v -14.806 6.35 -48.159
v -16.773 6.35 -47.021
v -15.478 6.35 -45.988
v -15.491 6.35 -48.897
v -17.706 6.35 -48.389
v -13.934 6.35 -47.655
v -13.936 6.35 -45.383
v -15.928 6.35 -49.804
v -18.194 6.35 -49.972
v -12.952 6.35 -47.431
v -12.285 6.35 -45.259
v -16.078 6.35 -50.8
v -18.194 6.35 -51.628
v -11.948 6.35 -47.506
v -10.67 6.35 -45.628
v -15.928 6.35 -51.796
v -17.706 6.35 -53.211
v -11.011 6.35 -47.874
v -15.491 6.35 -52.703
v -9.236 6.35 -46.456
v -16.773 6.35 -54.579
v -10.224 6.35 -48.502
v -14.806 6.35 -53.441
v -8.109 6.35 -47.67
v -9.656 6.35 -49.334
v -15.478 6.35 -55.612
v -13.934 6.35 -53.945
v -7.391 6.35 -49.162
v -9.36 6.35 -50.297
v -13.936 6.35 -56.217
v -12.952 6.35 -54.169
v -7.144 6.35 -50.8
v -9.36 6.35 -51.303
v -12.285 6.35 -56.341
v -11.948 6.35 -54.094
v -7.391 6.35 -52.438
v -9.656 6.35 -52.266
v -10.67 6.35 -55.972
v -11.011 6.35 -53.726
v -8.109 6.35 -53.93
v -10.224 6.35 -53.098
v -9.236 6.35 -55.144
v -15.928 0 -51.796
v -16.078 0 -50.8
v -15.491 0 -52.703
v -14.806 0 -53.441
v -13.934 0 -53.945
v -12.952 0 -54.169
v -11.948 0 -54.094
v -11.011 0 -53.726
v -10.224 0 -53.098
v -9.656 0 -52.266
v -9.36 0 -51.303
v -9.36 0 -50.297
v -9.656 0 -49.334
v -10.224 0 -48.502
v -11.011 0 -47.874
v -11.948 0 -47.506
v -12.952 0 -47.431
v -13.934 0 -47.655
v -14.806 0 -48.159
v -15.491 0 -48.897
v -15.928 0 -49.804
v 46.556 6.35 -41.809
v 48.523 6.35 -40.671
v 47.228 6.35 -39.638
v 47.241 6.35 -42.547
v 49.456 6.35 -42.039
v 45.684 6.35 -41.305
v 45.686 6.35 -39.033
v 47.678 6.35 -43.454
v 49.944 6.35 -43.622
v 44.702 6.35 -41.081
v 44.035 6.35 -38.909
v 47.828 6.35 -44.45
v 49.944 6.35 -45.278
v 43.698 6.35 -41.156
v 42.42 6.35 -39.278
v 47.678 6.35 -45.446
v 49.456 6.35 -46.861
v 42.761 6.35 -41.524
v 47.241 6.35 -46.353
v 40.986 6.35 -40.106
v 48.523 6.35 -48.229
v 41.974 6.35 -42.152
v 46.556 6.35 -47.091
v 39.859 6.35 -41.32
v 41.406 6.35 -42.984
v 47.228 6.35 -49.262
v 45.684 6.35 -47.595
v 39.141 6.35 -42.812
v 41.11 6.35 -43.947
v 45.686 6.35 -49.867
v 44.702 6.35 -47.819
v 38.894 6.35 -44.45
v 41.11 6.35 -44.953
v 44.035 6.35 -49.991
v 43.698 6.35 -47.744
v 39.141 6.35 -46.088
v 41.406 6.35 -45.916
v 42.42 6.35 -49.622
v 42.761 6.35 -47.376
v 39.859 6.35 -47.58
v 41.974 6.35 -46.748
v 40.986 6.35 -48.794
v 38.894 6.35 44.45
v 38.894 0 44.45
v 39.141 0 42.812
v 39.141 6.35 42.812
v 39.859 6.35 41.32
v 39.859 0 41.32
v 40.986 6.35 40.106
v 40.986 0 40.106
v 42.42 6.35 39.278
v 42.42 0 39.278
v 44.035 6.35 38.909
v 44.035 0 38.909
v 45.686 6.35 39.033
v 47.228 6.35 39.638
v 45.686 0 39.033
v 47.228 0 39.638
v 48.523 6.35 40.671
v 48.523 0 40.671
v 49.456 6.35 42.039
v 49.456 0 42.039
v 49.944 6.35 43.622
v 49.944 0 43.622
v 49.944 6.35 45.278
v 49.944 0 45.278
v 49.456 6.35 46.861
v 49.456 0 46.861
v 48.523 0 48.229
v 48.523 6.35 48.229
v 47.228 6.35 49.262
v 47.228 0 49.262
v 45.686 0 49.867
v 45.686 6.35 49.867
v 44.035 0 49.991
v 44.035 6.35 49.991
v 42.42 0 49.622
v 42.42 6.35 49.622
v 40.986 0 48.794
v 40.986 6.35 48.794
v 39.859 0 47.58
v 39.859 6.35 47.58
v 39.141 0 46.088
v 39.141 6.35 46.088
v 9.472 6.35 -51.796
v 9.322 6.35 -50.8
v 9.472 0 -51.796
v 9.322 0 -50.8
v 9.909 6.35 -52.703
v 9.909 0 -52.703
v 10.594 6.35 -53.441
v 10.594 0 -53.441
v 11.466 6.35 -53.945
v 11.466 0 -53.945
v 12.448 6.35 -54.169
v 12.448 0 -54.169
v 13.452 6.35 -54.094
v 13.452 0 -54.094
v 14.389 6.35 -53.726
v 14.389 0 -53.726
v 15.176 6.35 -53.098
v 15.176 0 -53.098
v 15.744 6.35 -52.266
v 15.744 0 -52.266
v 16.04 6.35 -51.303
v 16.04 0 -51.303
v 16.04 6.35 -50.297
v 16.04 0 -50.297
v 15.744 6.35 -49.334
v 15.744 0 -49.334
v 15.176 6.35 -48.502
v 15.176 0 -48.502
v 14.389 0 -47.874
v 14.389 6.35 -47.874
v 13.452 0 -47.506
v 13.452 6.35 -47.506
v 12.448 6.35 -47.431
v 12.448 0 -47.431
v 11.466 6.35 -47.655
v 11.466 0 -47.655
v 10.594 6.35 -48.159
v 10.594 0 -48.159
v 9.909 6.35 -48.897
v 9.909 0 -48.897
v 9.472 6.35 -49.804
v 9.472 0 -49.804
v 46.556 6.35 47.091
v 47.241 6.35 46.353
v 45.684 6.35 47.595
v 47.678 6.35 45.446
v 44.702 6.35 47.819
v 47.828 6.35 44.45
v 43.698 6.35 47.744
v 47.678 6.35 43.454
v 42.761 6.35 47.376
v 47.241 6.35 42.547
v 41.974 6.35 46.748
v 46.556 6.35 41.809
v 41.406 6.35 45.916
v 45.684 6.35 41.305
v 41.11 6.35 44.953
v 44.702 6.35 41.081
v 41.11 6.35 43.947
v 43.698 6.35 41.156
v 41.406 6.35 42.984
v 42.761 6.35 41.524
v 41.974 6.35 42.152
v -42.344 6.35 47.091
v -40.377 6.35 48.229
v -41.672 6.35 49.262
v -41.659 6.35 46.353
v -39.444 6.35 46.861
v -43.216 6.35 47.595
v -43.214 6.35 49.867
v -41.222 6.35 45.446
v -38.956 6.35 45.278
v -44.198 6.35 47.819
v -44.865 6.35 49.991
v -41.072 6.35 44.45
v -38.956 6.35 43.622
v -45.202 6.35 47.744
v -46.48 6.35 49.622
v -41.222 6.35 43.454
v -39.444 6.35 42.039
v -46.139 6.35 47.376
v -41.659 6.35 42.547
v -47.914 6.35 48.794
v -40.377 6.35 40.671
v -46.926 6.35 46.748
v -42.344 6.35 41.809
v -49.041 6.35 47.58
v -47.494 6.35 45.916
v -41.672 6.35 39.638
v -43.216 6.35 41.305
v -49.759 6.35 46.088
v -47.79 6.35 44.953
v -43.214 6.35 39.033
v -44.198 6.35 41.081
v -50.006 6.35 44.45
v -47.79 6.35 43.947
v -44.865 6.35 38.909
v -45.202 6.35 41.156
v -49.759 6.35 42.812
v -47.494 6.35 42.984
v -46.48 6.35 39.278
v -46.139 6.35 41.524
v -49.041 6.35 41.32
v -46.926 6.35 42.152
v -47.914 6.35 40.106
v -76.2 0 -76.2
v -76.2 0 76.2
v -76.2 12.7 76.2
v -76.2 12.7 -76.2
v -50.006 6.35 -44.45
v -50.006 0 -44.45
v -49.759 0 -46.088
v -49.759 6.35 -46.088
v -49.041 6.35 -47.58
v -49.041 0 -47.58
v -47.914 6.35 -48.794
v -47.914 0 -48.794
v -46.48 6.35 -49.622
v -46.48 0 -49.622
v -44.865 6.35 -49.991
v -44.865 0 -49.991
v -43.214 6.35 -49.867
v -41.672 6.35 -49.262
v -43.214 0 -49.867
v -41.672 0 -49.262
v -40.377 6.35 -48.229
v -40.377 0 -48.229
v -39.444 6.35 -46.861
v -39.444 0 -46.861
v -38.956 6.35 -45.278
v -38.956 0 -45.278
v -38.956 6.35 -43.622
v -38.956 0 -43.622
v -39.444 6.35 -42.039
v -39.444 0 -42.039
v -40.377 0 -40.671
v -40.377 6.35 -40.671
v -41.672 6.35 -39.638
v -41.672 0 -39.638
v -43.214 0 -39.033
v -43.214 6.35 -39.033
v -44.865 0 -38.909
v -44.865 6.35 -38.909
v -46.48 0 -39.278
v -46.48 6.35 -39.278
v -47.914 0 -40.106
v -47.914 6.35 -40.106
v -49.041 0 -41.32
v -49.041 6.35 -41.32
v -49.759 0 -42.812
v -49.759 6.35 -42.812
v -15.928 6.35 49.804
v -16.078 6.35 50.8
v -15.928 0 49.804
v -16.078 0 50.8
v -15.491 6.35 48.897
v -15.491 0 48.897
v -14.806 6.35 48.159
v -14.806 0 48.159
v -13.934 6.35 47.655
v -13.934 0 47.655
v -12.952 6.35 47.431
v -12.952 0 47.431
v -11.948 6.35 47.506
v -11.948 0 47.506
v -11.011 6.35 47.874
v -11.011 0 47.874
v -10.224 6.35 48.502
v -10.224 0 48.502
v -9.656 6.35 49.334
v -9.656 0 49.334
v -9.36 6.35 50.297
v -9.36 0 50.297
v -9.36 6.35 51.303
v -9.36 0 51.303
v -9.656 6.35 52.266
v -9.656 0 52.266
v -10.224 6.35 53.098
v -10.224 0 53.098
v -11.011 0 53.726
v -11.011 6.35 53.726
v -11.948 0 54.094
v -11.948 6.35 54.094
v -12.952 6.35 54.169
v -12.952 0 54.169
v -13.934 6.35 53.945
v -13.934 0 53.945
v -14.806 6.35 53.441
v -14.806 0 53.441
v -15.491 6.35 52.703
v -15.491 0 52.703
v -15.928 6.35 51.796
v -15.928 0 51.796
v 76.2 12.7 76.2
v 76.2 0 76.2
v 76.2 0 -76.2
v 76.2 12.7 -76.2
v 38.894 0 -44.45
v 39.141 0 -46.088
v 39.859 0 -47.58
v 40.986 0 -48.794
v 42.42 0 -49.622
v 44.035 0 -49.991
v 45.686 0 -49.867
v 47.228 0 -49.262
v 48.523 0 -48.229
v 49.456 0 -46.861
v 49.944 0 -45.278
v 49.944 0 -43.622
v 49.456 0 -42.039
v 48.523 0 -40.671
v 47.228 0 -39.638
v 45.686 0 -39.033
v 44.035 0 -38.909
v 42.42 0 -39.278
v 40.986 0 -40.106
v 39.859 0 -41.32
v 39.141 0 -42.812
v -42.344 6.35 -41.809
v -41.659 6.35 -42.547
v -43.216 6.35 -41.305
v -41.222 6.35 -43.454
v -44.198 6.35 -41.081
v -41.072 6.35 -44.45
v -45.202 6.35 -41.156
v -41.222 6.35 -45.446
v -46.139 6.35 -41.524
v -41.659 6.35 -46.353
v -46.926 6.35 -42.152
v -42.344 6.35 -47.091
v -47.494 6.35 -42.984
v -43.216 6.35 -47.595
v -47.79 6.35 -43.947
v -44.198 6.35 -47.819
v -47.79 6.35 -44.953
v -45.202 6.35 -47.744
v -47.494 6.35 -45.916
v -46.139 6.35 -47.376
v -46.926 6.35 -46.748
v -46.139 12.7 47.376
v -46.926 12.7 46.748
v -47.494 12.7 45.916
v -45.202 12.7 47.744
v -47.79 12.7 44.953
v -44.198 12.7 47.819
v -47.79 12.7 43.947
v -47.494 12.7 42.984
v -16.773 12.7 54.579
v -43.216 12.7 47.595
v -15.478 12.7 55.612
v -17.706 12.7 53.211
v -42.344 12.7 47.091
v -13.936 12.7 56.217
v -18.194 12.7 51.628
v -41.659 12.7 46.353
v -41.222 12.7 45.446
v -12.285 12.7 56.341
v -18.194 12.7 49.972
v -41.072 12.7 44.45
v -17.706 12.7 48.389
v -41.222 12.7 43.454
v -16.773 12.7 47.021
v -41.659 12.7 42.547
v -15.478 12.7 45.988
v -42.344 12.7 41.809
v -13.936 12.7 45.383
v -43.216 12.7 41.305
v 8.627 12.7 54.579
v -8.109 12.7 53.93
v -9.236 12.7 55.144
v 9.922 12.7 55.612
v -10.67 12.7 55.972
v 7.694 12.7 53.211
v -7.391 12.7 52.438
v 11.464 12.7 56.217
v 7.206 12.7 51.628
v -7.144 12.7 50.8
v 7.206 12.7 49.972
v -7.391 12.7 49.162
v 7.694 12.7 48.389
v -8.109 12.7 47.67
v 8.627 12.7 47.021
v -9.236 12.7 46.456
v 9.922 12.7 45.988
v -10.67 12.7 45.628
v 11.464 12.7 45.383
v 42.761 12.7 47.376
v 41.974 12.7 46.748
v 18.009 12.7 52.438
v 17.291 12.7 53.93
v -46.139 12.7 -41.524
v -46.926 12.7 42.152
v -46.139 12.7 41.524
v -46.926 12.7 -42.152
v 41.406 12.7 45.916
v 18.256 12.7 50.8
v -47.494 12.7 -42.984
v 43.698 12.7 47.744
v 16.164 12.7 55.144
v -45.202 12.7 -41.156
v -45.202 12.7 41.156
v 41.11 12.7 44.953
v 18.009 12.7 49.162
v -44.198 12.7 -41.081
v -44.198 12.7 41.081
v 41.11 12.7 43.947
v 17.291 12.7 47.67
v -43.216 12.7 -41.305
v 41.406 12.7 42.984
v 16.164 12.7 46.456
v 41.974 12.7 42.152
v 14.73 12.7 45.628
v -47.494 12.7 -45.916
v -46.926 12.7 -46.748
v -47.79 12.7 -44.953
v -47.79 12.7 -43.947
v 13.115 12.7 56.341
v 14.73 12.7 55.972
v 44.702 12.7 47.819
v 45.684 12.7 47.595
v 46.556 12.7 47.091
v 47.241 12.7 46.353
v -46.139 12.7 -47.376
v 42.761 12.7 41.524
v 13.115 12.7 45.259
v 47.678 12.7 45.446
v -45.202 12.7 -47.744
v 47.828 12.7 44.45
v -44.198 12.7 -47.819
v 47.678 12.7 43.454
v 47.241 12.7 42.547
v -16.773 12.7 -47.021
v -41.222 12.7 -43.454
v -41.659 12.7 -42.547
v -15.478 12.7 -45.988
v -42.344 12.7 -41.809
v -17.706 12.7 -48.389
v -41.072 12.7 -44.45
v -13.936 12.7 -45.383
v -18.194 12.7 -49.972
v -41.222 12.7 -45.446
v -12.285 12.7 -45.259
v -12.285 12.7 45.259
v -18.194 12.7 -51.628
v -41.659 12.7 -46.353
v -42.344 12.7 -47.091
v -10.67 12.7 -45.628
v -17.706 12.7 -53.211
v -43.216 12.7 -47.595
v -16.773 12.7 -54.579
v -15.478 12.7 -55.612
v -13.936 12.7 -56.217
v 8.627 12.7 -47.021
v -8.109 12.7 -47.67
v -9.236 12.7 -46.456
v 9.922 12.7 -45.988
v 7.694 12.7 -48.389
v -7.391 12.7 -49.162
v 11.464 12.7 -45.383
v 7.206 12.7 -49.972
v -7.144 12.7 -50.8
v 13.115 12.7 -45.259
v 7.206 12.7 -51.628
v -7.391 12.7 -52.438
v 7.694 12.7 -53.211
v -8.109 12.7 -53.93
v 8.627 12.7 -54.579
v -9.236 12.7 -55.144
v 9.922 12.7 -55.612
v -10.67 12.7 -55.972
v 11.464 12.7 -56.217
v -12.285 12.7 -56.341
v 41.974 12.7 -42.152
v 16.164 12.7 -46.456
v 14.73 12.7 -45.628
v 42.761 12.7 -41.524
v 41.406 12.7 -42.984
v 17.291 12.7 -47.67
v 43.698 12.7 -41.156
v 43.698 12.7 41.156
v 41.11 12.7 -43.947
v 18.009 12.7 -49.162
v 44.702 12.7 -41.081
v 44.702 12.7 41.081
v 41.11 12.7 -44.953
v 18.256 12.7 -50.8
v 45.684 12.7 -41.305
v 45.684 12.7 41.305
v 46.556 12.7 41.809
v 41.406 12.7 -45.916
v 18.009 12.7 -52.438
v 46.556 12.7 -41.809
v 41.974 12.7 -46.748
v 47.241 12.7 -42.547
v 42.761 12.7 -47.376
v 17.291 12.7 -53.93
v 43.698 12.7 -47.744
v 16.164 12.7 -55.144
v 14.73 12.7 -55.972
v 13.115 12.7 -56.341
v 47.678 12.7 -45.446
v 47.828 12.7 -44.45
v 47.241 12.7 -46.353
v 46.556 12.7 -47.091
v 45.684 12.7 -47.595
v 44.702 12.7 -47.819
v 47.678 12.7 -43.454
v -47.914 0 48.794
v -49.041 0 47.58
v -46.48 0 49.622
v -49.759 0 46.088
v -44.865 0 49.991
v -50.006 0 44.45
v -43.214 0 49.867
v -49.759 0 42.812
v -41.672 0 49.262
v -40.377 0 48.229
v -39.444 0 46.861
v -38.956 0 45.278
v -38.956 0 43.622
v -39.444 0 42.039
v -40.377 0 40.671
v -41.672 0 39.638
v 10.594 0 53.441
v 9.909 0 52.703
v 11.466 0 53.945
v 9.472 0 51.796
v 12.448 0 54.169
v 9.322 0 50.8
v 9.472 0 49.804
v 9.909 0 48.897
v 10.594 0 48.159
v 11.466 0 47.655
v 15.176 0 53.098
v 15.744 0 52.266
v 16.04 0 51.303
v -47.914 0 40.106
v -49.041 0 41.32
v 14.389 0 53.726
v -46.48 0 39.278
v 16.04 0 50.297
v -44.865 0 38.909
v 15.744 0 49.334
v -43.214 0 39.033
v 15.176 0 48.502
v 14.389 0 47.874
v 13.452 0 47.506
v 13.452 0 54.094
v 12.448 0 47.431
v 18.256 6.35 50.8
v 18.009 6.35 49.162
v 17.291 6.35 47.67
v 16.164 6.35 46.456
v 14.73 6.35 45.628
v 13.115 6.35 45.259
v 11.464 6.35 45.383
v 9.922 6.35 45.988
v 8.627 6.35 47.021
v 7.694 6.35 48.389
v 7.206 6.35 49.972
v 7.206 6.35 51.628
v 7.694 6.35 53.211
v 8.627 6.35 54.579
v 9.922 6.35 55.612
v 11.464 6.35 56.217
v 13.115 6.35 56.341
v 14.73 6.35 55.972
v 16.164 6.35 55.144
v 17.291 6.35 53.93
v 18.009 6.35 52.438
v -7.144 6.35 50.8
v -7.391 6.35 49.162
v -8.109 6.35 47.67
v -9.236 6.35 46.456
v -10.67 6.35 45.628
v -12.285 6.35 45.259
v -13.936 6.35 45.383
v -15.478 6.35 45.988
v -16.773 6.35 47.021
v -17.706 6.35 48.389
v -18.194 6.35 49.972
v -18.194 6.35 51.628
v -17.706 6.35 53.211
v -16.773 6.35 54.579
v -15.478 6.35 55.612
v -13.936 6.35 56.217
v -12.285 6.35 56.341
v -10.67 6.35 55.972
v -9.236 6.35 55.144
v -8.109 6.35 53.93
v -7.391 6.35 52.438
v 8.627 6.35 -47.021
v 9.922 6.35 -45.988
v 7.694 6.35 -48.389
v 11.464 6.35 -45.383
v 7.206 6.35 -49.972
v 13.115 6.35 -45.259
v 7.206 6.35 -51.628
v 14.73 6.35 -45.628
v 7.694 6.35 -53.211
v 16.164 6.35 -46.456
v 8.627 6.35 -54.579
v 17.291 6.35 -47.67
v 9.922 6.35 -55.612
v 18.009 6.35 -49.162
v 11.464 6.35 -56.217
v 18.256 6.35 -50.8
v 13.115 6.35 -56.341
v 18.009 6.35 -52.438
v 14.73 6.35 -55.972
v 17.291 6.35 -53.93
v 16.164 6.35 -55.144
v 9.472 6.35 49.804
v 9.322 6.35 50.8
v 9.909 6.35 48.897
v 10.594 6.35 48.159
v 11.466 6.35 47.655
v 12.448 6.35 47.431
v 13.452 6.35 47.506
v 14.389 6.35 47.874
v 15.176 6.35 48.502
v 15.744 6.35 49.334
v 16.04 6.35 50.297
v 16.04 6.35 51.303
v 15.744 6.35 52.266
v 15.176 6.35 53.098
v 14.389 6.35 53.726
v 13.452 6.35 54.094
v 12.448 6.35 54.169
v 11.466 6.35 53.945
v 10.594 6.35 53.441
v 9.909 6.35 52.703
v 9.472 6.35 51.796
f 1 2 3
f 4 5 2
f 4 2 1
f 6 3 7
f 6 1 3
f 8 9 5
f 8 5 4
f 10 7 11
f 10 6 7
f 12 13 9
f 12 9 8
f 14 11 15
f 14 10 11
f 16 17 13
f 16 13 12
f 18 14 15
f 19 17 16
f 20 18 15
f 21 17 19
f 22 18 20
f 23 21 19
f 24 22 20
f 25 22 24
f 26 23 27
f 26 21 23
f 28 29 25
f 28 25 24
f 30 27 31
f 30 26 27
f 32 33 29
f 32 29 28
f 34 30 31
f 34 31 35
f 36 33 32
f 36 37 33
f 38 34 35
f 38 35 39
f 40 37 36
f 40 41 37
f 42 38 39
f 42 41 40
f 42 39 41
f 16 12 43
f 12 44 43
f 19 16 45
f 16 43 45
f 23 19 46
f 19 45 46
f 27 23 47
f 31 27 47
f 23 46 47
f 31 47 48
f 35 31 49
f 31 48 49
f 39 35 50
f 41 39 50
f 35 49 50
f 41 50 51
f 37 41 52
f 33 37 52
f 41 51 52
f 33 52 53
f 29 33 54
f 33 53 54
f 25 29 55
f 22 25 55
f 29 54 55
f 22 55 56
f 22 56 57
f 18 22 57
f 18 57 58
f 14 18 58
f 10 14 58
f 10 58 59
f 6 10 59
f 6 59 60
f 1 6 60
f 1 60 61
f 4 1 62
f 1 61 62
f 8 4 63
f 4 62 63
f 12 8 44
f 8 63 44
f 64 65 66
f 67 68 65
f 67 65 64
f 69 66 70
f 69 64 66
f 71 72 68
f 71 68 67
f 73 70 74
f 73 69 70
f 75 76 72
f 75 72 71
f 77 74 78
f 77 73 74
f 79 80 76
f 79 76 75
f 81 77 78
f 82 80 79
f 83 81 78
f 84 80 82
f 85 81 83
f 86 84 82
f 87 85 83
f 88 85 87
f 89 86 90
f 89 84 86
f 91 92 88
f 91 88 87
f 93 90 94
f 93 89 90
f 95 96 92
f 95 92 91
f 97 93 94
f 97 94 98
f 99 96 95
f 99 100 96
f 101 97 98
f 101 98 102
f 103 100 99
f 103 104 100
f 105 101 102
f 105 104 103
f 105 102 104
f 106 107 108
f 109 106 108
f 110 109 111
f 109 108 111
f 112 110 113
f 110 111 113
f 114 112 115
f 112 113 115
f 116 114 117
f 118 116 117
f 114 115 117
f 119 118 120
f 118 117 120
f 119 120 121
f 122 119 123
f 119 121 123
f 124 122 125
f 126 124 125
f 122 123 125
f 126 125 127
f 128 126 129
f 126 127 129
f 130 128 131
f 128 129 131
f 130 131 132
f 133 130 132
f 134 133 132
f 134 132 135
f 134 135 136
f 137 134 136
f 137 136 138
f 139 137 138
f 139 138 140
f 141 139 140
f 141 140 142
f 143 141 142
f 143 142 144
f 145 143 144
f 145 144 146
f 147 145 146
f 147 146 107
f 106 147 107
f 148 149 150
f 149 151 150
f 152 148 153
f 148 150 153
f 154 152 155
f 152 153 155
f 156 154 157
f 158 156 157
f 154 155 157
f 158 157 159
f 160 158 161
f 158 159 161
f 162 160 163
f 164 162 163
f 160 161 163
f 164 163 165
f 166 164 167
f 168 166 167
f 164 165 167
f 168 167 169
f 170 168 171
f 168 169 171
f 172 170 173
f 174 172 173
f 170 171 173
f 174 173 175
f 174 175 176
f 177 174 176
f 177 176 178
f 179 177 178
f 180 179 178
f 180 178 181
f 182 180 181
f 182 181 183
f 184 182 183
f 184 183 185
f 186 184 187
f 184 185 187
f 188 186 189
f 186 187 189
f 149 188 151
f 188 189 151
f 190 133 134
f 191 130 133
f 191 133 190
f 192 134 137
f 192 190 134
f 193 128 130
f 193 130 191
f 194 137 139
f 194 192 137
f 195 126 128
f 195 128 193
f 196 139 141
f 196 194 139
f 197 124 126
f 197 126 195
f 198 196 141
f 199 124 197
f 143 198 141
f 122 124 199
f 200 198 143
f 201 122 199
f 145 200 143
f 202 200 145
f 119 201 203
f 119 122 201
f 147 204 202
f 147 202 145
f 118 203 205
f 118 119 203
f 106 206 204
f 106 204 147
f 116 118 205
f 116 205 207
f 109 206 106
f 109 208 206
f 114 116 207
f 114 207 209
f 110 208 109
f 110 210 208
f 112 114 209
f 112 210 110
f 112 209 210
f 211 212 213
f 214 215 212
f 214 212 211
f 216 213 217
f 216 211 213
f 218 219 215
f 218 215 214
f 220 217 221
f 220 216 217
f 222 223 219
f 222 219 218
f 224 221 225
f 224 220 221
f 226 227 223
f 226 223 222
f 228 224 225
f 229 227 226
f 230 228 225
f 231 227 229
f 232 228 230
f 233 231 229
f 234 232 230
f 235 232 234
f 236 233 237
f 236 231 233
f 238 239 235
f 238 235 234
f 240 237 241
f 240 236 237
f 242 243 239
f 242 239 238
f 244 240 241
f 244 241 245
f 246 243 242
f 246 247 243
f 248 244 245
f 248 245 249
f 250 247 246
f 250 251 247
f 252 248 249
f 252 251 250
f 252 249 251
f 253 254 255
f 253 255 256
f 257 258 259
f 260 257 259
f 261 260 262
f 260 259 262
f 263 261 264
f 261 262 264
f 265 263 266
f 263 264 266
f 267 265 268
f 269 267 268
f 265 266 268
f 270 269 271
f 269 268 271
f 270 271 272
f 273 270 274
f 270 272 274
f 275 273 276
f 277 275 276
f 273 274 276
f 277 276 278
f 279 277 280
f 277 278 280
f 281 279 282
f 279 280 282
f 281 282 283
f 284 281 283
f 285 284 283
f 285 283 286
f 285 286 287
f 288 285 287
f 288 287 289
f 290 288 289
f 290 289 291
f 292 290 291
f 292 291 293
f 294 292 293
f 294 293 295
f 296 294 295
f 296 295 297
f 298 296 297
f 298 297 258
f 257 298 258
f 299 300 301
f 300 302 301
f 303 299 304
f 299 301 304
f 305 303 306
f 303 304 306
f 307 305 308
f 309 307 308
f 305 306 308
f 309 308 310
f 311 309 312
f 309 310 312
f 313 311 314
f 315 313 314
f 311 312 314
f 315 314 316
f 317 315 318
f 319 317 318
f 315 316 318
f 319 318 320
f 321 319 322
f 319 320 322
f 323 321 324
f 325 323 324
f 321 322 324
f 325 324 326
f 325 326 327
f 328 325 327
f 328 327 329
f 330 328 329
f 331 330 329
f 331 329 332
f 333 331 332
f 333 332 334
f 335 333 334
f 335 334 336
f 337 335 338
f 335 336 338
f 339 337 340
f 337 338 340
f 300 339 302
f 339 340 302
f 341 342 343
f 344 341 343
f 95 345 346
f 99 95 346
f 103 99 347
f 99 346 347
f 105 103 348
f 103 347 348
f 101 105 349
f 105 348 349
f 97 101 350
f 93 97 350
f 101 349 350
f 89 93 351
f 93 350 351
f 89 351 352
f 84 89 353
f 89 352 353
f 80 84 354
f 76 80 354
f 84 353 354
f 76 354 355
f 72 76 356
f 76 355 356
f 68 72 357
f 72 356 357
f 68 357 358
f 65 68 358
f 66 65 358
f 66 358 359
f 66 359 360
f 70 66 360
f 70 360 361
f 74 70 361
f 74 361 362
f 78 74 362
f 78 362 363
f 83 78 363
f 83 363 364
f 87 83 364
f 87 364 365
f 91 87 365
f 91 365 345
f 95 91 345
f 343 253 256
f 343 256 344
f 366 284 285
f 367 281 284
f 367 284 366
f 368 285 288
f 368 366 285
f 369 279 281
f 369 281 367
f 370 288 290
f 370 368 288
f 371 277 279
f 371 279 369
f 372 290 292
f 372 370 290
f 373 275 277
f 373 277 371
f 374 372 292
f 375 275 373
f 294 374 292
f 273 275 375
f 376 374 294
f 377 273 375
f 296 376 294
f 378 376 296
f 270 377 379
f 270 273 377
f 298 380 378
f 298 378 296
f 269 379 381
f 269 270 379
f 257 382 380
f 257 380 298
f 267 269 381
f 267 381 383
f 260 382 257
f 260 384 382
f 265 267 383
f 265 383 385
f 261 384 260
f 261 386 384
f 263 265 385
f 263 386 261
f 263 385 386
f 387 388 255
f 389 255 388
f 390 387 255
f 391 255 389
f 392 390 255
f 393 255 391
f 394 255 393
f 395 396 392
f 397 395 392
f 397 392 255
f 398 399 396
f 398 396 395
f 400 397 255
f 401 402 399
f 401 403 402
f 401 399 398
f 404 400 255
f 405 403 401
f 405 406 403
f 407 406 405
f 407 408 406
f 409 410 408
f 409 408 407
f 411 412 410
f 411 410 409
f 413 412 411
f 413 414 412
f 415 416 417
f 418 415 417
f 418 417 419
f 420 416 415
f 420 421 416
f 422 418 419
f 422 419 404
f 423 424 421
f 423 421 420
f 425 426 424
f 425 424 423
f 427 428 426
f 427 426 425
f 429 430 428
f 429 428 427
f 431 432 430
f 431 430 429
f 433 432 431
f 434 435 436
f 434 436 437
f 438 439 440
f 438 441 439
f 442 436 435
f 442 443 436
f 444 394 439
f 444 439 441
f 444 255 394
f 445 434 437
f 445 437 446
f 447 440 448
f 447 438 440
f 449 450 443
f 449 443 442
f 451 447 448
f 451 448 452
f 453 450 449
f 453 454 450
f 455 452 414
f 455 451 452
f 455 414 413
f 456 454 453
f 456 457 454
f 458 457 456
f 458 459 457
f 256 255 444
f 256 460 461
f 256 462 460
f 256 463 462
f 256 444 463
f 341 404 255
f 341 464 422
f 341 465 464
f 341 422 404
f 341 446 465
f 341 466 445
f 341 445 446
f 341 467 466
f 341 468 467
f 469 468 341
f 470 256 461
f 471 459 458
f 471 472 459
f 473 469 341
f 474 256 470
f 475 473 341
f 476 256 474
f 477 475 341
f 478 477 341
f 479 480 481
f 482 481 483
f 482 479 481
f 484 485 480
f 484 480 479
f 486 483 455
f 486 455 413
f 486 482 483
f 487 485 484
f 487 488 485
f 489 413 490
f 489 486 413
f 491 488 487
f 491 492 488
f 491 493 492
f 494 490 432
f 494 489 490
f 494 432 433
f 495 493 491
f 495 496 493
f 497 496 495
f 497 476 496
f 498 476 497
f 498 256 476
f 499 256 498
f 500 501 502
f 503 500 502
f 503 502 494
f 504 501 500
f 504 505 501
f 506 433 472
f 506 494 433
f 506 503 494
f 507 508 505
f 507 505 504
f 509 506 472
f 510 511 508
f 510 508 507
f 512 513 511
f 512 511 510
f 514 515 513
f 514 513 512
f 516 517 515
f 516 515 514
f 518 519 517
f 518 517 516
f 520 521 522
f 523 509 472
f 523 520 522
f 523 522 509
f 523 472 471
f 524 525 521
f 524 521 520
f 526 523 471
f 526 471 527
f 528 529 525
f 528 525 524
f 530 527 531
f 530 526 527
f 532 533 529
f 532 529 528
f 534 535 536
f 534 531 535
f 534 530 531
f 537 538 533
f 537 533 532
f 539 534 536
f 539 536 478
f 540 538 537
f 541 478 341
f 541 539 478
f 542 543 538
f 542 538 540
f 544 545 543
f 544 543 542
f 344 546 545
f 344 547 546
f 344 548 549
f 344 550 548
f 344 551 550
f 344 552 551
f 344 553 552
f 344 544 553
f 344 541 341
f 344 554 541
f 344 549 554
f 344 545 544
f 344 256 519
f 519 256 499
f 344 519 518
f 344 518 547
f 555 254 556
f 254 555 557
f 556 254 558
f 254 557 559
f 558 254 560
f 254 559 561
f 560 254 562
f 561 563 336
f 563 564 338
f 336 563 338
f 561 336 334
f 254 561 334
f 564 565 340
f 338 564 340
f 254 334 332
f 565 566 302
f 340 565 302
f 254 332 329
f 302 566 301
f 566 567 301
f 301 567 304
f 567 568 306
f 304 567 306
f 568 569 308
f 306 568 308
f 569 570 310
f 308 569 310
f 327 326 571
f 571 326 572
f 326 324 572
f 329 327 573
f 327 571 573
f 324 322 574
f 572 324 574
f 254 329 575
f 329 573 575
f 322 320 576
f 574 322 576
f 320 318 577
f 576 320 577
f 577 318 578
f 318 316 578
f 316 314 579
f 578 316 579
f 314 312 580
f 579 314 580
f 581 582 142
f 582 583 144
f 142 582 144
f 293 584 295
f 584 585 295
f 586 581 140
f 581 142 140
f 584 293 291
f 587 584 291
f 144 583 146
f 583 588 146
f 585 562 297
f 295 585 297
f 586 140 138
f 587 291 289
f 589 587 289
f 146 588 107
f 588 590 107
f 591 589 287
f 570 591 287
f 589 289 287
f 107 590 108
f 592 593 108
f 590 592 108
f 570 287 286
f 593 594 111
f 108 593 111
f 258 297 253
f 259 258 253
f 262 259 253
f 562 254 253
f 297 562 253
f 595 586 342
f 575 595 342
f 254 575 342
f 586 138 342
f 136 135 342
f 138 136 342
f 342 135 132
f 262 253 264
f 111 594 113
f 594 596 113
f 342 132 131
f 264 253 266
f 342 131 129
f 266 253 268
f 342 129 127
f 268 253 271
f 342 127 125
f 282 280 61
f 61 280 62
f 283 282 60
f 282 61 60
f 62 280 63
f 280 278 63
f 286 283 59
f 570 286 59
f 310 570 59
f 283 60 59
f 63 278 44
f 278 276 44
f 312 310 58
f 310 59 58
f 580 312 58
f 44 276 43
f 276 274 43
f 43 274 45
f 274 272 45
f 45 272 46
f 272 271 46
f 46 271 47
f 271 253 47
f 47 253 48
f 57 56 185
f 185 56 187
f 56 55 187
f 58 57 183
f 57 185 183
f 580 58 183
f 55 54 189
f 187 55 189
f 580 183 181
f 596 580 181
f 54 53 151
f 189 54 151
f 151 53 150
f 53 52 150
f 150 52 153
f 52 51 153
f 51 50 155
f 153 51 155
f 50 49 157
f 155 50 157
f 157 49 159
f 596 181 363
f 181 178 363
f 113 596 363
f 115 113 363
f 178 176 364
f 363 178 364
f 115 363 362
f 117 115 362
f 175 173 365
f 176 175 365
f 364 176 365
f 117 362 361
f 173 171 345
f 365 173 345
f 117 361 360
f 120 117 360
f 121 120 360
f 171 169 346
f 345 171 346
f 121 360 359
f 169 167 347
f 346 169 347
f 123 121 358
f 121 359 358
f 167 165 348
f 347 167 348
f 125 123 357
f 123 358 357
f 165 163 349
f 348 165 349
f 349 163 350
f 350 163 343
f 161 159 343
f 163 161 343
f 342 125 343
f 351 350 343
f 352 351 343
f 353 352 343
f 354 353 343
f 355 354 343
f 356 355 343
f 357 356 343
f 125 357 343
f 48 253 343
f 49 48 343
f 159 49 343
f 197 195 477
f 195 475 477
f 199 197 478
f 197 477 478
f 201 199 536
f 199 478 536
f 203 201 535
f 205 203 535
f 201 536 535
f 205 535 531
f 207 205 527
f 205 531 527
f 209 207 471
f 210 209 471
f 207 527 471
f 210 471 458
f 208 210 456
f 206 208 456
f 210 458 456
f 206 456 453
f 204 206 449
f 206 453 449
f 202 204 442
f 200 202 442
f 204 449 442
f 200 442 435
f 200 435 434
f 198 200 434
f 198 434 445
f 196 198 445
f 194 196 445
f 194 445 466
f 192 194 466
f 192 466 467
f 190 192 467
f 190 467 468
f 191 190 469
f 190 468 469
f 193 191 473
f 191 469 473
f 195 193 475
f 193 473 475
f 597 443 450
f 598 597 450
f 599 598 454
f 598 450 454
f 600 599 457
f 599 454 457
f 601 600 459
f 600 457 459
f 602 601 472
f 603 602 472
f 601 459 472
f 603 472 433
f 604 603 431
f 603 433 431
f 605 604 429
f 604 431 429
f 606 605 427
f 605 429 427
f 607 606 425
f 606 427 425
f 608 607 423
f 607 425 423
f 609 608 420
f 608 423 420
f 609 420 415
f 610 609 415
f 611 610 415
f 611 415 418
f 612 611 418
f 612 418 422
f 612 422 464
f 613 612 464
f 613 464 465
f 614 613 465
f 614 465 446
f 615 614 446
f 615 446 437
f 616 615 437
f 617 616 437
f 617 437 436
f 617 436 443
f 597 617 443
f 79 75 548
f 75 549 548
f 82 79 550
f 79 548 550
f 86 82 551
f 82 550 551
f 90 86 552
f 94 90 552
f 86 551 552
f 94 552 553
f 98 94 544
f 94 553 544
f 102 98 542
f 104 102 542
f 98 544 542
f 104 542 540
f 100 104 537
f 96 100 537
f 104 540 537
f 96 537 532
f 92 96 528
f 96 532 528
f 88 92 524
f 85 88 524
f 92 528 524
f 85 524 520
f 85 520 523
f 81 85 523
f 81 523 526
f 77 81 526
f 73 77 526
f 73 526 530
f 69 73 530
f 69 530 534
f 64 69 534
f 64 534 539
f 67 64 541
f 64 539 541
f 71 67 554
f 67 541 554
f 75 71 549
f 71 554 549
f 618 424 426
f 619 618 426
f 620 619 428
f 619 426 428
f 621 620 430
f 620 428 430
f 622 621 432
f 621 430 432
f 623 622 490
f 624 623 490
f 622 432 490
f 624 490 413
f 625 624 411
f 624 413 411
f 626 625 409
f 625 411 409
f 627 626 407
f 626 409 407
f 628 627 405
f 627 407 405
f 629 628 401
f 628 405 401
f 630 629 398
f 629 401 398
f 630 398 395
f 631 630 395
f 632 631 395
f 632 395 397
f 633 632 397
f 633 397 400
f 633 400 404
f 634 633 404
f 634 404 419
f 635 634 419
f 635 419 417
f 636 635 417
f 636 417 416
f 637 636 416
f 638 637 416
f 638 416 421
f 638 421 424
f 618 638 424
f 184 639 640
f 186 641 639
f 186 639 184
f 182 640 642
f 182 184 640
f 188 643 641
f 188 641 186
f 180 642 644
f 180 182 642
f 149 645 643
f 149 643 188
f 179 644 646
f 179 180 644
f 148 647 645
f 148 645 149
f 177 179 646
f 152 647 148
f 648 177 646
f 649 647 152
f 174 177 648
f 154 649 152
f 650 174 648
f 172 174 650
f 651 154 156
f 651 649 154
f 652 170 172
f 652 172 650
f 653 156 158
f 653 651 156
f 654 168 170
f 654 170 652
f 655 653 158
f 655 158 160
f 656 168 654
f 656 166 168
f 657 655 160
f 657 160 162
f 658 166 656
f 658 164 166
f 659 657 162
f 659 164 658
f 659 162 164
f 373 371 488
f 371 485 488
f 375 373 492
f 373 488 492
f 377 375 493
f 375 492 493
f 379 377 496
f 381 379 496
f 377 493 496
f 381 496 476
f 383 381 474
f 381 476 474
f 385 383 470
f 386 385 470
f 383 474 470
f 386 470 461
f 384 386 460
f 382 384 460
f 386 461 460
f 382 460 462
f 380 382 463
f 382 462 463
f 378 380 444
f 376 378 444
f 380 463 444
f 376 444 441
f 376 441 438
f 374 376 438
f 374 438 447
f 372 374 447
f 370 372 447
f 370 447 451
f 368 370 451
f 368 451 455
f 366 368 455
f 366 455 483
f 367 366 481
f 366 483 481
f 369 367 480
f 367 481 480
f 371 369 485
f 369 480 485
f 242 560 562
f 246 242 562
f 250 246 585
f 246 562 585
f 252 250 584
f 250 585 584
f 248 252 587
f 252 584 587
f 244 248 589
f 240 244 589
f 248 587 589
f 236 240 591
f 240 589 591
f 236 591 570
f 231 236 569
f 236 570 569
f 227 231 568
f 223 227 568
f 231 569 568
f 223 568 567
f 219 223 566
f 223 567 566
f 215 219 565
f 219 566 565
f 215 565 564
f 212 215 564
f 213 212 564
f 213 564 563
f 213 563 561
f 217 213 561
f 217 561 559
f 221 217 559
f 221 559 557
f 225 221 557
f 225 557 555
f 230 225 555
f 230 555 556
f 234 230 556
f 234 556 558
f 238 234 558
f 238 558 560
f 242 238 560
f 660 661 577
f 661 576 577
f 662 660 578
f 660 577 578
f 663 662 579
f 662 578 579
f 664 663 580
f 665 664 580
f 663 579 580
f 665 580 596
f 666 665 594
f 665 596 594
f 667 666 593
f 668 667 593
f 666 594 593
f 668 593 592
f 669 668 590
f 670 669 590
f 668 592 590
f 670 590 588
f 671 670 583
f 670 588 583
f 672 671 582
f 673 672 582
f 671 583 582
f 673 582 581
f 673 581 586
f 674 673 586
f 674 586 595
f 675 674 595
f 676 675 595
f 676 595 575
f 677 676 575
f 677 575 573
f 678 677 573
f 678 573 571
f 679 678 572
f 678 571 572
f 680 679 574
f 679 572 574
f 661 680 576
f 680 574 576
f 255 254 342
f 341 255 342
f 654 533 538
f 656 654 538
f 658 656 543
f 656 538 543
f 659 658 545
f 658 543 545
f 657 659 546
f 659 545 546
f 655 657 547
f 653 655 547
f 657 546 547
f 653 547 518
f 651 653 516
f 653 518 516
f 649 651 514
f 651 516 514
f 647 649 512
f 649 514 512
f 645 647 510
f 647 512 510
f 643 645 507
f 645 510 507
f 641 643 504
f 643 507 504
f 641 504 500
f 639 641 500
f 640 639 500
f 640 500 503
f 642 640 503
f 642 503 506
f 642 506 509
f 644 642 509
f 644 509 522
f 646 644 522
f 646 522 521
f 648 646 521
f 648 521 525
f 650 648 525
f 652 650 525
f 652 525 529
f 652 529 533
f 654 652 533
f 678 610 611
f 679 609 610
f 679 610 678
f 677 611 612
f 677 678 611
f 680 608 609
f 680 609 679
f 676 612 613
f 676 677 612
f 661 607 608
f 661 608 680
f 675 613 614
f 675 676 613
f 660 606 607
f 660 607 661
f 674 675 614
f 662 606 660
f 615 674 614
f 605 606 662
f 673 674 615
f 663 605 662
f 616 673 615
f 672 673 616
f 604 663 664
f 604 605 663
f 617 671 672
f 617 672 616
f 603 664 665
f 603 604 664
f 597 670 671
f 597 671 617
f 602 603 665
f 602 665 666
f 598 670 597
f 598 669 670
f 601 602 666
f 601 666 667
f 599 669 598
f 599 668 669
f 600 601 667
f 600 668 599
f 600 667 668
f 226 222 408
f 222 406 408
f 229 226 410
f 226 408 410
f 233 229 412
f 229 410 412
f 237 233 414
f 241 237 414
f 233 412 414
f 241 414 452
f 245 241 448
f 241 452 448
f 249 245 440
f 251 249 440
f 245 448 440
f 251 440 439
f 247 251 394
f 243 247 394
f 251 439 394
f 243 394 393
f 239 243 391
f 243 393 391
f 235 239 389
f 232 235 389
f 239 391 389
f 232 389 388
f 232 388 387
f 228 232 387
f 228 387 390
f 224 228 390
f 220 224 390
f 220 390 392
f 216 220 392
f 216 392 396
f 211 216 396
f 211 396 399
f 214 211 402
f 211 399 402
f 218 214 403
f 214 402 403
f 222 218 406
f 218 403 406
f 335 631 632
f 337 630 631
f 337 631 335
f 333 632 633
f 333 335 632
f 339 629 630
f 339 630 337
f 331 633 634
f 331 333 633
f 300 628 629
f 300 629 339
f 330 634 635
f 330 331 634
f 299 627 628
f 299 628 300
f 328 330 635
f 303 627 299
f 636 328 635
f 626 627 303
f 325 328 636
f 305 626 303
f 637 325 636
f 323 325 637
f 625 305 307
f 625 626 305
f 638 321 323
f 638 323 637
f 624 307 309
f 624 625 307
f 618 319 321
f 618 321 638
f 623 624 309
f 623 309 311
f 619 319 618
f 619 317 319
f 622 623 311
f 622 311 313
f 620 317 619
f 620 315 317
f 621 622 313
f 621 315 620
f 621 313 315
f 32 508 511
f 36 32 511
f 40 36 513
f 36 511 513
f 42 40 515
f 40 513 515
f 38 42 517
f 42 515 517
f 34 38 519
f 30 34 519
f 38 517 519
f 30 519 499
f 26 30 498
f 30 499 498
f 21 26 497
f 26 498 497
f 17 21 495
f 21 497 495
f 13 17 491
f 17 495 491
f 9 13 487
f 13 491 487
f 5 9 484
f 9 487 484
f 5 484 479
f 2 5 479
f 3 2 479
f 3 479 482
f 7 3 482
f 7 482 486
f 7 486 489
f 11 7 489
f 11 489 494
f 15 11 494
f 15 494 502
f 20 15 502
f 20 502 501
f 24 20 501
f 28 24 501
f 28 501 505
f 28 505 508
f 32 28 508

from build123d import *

# Parameters (mm, degrees)
SKETCH1_W                                        = 152.4
SKETCH1_H                                        = 152.4
BOSS_EXTRUDE1_DEPTH                              = 12.7
CBORE_FOR_1_4_SOCKET_HEAD_CAP_SCREW1_D           = 6.7564
CBORE_FOR_1_4_SOCKET_HEAD_CAP_SCREW1_CBORE_D     = 11.1125
CBORE_FOR_1_4_SOCKET_HEAD_CAP_SCREW1_CBORE_DEPTH = 6.35
CBORE_FOR_1_4_SOCKET_HEAD_CAP_SCREW2_D           = 6.7564
CBORE_FOR_1_4_SOCKET_HEAD_CAP_SCREW2_CBORE_D     = 11.1125
CBORE_FOR_1_4_SOCKET_HEAD_CAP_SCREW2_CBORE_DEPTH = 6.35


with BuildPart() as part:
    # Sketch1 → Boss-Extrude1 (new body)
    with BuildSketch(Plane(origin=(0, 0, 0), x_dir=(1, 0, 0), z_dir=(0, 1, 0))):
        Rectangle(SKETCH1_W, SKETCH1_H)
    extrude(amount=BOSS_EXTRUDE1_DEPTH)

    # CBORE for 1/4 Socket Head Cap Screw1 (through all)
    with Locations(Plane(origin=(0, 12.7, 0), x_dir=(1, 0, 0), z_dir=(0, 1, 0))):
        with Locations((-12.7, -50.8), (12.7, -50.8), (12.7, 50.8), (-12.7, 50.8)):
            CounterBoreHole(CBORE_FOR_1_4_SOCKET_HEAD_CAP_SCREW1_D / 2, CBORE_FOR_1_4_SOCKET_HEAD_CAP_SCREW1_CBORE_D / 2, CBORE_FOR_1_4_SOCKET_HEAD_CAP_SCREW1_CBORE_DEPTH)

    # CBORE for 1/4 Socket Head Cap Screw2 (through all)
    with Locations(Plane(origin=(0, 0, 0), x_dir=(-1, 0, 0), z_dir=(0, -1, 0))):
        with Locations((-44.45, -44.45), (-44.45, 44.45), (44.45, 44.45), (44.45, -44.45)):
            CounterBoreHole(CBORE_FOR_1_4_SOCKET_HEAD_CAP_SCREW2_D / 2, CBORE_FOR_1_4_SOCKET_HEAD_CAP_SCREW2_CBORE_D / 2, CBORE_FOR_1_4_SOCKET_HEAD_CAP_SCREW2_CBORE_DEPTH)


solid = part.part
